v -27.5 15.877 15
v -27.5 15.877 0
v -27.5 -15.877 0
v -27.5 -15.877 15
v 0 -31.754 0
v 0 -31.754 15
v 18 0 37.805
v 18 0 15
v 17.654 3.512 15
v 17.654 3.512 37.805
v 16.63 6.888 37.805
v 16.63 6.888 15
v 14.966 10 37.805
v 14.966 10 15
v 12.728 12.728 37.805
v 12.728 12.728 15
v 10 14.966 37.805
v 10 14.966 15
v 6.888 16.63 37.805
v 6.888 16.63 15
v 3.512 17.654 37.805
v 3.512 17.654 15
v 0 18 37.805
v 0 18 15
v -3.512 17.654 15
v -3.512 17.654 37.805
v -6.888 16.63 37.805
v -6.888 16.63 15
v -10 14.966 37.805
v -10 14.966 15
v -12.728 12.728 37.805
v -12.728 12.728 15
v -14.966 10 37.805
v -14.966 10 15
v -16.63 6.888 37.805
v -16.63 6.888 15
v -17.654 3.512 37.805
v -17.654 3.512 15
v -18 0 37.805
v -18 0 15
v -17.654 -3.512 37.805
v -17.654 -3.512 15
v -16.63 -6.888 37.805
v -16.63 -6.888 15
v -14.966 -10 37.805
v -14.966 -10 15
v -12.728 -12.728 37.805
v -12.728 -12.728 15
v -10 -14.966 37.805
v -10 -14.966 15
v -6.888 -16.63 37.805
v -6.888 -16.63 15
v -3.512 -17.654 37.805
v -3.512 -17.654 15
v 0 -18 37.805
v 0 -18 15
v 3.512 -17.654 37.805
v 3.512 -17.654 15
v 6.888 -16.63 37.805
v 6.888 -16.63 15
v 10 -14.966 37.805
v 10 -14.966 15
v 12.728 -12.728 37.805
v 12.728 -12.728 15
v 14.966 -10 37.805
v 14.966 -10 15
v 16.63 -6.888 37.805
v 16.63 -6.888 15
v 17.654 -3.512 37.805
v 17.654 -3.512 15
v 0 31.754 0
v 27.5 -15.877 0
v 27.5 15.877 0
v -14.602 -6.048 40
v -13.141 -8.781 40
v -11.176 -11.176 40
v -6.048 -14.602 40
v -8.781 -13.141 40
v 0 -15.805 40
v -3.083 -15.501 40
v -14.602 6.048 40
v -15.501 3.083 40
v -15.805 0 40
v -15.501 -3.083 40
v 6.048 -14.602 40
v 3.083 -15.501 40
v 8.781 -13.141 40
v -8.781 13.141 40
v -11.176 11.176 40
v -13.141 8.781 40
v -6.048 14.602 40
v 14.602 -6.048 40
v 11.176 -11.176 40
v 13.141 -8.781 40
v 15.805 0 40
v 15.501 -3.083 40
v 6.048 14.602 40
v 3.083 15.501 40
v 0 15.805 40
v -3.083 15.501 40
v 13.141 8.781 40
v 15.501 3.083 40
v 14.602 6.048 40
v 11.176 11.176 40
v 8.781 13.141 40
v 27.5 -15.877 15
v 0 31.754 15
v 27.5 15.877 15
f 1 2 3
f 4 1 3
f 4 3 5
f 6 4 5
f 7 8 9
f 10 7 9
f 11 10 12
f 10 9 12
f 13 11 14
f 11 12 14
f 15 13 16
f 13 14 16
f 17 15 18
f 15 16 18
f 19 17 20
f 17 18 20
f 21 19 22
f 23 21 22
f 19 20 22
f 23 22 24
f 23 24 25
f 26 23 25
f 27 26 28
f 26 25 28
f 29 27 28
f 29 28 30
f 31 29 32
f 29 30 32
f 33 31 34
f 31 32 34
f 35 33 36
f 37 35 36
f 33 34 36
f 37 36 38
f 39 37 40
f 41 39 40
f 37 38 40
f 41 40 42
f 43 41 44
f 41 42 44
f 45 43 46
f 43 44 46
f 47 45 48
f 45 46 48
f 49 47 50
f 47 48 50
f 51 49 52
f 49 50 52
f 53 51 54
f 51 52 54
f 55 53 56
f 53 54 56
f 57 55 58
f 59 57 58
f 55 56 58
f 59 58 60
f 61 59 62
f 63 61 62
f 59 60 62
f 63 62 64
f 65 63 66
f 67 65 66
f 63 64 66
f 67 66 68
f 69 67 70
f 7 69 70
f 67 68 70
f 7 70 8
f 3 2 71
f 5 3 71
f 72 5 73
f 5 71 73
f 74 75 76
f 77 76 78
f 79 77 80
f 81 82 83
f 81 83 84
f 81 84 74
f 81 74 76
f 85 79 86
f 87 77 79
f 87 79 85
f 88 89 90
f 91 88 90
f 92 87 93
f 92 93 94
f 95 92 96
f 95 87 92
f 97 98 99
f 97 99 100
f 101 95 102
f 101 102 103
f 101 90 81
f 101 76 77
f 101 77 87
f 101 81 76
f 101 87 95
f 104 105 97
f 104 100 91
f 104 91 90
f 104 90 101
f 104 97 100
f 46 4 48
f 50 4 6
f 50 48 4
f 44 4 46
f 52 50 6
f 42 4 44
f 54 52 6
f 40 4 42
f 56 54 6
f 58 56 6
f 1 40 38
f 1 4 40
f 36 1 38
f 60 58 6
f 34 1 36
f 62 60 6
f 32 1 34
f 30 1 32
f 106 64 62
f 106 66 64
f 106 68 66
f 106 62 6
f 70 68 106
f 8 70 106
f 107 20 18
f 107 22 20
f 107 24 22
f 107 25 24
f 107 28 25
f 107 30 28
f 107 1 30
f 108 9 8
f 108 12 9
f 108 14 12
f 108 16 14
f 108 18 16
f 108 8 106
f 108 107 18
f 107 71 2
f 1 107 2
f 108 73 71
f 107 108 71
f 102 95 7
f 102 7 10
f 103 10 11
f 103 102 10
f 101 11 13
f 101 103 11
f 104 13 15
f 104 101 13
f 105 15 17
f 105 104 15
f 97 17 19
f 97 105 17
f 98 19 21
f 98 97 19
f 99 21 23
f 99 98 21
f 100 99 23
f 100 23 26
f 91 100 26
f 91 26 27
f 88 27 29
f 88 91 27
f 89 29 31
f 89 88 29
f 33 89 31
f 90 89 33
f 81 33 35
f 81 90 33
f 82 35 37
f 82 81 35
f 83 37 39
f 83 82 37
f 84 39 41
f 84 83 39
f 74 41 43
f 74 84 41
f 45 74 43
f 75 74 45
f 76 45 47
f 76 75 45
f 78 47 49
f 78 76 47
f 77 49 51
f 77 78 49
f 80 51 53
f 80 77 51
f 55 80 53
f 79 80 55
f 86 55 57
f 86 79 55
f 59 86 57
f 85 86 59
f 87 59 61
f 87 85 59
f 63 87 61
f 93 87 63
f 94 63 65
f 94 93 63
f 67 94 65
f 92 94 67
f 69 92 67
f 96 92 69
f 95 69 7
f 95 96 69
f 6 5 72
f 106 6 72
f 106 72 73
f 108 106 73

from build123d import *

# Parameters (mm, degrees)
EXTRUDE_1_DEPTH = 15
SKETCH_2_R      = 18
EXTRUDE_2_DEPTH = 25
CHAMFER_1_SIZE  = 2.195


with BuildPart() as part:
    # Эскиз1 → Бобышка-Вытянуть1 (new body)
    with BuildSketch(Plane.XY):
        Polygon((0, 31.754264805), (-27.5, 15.877132403), (-27.5, -15.877132403), (0, -31.754264805), (27.5, -15.877132403), (27.5, 15.877132403), align=None)
    extrude(amount=EXTRUDE_1_DEPTH)

    # Эскиз2 → Бобышка-Вытянуть2 (add)
    with BuildSketch(Plane.XY.offset(15)):
        Circle(SKETCH_2_R)
    extrude(amount=EXTRUDE_2_DEPTH)

    # Фаска1
    chamfer_1_edges = [part.edges().sort_by_distance(p)[0] for p in [
        (-18, 0, 40),
    ]]
    chamfer(chamfer_1_edges, length=CHAMFER_1_SIZE)


solid = part.part
